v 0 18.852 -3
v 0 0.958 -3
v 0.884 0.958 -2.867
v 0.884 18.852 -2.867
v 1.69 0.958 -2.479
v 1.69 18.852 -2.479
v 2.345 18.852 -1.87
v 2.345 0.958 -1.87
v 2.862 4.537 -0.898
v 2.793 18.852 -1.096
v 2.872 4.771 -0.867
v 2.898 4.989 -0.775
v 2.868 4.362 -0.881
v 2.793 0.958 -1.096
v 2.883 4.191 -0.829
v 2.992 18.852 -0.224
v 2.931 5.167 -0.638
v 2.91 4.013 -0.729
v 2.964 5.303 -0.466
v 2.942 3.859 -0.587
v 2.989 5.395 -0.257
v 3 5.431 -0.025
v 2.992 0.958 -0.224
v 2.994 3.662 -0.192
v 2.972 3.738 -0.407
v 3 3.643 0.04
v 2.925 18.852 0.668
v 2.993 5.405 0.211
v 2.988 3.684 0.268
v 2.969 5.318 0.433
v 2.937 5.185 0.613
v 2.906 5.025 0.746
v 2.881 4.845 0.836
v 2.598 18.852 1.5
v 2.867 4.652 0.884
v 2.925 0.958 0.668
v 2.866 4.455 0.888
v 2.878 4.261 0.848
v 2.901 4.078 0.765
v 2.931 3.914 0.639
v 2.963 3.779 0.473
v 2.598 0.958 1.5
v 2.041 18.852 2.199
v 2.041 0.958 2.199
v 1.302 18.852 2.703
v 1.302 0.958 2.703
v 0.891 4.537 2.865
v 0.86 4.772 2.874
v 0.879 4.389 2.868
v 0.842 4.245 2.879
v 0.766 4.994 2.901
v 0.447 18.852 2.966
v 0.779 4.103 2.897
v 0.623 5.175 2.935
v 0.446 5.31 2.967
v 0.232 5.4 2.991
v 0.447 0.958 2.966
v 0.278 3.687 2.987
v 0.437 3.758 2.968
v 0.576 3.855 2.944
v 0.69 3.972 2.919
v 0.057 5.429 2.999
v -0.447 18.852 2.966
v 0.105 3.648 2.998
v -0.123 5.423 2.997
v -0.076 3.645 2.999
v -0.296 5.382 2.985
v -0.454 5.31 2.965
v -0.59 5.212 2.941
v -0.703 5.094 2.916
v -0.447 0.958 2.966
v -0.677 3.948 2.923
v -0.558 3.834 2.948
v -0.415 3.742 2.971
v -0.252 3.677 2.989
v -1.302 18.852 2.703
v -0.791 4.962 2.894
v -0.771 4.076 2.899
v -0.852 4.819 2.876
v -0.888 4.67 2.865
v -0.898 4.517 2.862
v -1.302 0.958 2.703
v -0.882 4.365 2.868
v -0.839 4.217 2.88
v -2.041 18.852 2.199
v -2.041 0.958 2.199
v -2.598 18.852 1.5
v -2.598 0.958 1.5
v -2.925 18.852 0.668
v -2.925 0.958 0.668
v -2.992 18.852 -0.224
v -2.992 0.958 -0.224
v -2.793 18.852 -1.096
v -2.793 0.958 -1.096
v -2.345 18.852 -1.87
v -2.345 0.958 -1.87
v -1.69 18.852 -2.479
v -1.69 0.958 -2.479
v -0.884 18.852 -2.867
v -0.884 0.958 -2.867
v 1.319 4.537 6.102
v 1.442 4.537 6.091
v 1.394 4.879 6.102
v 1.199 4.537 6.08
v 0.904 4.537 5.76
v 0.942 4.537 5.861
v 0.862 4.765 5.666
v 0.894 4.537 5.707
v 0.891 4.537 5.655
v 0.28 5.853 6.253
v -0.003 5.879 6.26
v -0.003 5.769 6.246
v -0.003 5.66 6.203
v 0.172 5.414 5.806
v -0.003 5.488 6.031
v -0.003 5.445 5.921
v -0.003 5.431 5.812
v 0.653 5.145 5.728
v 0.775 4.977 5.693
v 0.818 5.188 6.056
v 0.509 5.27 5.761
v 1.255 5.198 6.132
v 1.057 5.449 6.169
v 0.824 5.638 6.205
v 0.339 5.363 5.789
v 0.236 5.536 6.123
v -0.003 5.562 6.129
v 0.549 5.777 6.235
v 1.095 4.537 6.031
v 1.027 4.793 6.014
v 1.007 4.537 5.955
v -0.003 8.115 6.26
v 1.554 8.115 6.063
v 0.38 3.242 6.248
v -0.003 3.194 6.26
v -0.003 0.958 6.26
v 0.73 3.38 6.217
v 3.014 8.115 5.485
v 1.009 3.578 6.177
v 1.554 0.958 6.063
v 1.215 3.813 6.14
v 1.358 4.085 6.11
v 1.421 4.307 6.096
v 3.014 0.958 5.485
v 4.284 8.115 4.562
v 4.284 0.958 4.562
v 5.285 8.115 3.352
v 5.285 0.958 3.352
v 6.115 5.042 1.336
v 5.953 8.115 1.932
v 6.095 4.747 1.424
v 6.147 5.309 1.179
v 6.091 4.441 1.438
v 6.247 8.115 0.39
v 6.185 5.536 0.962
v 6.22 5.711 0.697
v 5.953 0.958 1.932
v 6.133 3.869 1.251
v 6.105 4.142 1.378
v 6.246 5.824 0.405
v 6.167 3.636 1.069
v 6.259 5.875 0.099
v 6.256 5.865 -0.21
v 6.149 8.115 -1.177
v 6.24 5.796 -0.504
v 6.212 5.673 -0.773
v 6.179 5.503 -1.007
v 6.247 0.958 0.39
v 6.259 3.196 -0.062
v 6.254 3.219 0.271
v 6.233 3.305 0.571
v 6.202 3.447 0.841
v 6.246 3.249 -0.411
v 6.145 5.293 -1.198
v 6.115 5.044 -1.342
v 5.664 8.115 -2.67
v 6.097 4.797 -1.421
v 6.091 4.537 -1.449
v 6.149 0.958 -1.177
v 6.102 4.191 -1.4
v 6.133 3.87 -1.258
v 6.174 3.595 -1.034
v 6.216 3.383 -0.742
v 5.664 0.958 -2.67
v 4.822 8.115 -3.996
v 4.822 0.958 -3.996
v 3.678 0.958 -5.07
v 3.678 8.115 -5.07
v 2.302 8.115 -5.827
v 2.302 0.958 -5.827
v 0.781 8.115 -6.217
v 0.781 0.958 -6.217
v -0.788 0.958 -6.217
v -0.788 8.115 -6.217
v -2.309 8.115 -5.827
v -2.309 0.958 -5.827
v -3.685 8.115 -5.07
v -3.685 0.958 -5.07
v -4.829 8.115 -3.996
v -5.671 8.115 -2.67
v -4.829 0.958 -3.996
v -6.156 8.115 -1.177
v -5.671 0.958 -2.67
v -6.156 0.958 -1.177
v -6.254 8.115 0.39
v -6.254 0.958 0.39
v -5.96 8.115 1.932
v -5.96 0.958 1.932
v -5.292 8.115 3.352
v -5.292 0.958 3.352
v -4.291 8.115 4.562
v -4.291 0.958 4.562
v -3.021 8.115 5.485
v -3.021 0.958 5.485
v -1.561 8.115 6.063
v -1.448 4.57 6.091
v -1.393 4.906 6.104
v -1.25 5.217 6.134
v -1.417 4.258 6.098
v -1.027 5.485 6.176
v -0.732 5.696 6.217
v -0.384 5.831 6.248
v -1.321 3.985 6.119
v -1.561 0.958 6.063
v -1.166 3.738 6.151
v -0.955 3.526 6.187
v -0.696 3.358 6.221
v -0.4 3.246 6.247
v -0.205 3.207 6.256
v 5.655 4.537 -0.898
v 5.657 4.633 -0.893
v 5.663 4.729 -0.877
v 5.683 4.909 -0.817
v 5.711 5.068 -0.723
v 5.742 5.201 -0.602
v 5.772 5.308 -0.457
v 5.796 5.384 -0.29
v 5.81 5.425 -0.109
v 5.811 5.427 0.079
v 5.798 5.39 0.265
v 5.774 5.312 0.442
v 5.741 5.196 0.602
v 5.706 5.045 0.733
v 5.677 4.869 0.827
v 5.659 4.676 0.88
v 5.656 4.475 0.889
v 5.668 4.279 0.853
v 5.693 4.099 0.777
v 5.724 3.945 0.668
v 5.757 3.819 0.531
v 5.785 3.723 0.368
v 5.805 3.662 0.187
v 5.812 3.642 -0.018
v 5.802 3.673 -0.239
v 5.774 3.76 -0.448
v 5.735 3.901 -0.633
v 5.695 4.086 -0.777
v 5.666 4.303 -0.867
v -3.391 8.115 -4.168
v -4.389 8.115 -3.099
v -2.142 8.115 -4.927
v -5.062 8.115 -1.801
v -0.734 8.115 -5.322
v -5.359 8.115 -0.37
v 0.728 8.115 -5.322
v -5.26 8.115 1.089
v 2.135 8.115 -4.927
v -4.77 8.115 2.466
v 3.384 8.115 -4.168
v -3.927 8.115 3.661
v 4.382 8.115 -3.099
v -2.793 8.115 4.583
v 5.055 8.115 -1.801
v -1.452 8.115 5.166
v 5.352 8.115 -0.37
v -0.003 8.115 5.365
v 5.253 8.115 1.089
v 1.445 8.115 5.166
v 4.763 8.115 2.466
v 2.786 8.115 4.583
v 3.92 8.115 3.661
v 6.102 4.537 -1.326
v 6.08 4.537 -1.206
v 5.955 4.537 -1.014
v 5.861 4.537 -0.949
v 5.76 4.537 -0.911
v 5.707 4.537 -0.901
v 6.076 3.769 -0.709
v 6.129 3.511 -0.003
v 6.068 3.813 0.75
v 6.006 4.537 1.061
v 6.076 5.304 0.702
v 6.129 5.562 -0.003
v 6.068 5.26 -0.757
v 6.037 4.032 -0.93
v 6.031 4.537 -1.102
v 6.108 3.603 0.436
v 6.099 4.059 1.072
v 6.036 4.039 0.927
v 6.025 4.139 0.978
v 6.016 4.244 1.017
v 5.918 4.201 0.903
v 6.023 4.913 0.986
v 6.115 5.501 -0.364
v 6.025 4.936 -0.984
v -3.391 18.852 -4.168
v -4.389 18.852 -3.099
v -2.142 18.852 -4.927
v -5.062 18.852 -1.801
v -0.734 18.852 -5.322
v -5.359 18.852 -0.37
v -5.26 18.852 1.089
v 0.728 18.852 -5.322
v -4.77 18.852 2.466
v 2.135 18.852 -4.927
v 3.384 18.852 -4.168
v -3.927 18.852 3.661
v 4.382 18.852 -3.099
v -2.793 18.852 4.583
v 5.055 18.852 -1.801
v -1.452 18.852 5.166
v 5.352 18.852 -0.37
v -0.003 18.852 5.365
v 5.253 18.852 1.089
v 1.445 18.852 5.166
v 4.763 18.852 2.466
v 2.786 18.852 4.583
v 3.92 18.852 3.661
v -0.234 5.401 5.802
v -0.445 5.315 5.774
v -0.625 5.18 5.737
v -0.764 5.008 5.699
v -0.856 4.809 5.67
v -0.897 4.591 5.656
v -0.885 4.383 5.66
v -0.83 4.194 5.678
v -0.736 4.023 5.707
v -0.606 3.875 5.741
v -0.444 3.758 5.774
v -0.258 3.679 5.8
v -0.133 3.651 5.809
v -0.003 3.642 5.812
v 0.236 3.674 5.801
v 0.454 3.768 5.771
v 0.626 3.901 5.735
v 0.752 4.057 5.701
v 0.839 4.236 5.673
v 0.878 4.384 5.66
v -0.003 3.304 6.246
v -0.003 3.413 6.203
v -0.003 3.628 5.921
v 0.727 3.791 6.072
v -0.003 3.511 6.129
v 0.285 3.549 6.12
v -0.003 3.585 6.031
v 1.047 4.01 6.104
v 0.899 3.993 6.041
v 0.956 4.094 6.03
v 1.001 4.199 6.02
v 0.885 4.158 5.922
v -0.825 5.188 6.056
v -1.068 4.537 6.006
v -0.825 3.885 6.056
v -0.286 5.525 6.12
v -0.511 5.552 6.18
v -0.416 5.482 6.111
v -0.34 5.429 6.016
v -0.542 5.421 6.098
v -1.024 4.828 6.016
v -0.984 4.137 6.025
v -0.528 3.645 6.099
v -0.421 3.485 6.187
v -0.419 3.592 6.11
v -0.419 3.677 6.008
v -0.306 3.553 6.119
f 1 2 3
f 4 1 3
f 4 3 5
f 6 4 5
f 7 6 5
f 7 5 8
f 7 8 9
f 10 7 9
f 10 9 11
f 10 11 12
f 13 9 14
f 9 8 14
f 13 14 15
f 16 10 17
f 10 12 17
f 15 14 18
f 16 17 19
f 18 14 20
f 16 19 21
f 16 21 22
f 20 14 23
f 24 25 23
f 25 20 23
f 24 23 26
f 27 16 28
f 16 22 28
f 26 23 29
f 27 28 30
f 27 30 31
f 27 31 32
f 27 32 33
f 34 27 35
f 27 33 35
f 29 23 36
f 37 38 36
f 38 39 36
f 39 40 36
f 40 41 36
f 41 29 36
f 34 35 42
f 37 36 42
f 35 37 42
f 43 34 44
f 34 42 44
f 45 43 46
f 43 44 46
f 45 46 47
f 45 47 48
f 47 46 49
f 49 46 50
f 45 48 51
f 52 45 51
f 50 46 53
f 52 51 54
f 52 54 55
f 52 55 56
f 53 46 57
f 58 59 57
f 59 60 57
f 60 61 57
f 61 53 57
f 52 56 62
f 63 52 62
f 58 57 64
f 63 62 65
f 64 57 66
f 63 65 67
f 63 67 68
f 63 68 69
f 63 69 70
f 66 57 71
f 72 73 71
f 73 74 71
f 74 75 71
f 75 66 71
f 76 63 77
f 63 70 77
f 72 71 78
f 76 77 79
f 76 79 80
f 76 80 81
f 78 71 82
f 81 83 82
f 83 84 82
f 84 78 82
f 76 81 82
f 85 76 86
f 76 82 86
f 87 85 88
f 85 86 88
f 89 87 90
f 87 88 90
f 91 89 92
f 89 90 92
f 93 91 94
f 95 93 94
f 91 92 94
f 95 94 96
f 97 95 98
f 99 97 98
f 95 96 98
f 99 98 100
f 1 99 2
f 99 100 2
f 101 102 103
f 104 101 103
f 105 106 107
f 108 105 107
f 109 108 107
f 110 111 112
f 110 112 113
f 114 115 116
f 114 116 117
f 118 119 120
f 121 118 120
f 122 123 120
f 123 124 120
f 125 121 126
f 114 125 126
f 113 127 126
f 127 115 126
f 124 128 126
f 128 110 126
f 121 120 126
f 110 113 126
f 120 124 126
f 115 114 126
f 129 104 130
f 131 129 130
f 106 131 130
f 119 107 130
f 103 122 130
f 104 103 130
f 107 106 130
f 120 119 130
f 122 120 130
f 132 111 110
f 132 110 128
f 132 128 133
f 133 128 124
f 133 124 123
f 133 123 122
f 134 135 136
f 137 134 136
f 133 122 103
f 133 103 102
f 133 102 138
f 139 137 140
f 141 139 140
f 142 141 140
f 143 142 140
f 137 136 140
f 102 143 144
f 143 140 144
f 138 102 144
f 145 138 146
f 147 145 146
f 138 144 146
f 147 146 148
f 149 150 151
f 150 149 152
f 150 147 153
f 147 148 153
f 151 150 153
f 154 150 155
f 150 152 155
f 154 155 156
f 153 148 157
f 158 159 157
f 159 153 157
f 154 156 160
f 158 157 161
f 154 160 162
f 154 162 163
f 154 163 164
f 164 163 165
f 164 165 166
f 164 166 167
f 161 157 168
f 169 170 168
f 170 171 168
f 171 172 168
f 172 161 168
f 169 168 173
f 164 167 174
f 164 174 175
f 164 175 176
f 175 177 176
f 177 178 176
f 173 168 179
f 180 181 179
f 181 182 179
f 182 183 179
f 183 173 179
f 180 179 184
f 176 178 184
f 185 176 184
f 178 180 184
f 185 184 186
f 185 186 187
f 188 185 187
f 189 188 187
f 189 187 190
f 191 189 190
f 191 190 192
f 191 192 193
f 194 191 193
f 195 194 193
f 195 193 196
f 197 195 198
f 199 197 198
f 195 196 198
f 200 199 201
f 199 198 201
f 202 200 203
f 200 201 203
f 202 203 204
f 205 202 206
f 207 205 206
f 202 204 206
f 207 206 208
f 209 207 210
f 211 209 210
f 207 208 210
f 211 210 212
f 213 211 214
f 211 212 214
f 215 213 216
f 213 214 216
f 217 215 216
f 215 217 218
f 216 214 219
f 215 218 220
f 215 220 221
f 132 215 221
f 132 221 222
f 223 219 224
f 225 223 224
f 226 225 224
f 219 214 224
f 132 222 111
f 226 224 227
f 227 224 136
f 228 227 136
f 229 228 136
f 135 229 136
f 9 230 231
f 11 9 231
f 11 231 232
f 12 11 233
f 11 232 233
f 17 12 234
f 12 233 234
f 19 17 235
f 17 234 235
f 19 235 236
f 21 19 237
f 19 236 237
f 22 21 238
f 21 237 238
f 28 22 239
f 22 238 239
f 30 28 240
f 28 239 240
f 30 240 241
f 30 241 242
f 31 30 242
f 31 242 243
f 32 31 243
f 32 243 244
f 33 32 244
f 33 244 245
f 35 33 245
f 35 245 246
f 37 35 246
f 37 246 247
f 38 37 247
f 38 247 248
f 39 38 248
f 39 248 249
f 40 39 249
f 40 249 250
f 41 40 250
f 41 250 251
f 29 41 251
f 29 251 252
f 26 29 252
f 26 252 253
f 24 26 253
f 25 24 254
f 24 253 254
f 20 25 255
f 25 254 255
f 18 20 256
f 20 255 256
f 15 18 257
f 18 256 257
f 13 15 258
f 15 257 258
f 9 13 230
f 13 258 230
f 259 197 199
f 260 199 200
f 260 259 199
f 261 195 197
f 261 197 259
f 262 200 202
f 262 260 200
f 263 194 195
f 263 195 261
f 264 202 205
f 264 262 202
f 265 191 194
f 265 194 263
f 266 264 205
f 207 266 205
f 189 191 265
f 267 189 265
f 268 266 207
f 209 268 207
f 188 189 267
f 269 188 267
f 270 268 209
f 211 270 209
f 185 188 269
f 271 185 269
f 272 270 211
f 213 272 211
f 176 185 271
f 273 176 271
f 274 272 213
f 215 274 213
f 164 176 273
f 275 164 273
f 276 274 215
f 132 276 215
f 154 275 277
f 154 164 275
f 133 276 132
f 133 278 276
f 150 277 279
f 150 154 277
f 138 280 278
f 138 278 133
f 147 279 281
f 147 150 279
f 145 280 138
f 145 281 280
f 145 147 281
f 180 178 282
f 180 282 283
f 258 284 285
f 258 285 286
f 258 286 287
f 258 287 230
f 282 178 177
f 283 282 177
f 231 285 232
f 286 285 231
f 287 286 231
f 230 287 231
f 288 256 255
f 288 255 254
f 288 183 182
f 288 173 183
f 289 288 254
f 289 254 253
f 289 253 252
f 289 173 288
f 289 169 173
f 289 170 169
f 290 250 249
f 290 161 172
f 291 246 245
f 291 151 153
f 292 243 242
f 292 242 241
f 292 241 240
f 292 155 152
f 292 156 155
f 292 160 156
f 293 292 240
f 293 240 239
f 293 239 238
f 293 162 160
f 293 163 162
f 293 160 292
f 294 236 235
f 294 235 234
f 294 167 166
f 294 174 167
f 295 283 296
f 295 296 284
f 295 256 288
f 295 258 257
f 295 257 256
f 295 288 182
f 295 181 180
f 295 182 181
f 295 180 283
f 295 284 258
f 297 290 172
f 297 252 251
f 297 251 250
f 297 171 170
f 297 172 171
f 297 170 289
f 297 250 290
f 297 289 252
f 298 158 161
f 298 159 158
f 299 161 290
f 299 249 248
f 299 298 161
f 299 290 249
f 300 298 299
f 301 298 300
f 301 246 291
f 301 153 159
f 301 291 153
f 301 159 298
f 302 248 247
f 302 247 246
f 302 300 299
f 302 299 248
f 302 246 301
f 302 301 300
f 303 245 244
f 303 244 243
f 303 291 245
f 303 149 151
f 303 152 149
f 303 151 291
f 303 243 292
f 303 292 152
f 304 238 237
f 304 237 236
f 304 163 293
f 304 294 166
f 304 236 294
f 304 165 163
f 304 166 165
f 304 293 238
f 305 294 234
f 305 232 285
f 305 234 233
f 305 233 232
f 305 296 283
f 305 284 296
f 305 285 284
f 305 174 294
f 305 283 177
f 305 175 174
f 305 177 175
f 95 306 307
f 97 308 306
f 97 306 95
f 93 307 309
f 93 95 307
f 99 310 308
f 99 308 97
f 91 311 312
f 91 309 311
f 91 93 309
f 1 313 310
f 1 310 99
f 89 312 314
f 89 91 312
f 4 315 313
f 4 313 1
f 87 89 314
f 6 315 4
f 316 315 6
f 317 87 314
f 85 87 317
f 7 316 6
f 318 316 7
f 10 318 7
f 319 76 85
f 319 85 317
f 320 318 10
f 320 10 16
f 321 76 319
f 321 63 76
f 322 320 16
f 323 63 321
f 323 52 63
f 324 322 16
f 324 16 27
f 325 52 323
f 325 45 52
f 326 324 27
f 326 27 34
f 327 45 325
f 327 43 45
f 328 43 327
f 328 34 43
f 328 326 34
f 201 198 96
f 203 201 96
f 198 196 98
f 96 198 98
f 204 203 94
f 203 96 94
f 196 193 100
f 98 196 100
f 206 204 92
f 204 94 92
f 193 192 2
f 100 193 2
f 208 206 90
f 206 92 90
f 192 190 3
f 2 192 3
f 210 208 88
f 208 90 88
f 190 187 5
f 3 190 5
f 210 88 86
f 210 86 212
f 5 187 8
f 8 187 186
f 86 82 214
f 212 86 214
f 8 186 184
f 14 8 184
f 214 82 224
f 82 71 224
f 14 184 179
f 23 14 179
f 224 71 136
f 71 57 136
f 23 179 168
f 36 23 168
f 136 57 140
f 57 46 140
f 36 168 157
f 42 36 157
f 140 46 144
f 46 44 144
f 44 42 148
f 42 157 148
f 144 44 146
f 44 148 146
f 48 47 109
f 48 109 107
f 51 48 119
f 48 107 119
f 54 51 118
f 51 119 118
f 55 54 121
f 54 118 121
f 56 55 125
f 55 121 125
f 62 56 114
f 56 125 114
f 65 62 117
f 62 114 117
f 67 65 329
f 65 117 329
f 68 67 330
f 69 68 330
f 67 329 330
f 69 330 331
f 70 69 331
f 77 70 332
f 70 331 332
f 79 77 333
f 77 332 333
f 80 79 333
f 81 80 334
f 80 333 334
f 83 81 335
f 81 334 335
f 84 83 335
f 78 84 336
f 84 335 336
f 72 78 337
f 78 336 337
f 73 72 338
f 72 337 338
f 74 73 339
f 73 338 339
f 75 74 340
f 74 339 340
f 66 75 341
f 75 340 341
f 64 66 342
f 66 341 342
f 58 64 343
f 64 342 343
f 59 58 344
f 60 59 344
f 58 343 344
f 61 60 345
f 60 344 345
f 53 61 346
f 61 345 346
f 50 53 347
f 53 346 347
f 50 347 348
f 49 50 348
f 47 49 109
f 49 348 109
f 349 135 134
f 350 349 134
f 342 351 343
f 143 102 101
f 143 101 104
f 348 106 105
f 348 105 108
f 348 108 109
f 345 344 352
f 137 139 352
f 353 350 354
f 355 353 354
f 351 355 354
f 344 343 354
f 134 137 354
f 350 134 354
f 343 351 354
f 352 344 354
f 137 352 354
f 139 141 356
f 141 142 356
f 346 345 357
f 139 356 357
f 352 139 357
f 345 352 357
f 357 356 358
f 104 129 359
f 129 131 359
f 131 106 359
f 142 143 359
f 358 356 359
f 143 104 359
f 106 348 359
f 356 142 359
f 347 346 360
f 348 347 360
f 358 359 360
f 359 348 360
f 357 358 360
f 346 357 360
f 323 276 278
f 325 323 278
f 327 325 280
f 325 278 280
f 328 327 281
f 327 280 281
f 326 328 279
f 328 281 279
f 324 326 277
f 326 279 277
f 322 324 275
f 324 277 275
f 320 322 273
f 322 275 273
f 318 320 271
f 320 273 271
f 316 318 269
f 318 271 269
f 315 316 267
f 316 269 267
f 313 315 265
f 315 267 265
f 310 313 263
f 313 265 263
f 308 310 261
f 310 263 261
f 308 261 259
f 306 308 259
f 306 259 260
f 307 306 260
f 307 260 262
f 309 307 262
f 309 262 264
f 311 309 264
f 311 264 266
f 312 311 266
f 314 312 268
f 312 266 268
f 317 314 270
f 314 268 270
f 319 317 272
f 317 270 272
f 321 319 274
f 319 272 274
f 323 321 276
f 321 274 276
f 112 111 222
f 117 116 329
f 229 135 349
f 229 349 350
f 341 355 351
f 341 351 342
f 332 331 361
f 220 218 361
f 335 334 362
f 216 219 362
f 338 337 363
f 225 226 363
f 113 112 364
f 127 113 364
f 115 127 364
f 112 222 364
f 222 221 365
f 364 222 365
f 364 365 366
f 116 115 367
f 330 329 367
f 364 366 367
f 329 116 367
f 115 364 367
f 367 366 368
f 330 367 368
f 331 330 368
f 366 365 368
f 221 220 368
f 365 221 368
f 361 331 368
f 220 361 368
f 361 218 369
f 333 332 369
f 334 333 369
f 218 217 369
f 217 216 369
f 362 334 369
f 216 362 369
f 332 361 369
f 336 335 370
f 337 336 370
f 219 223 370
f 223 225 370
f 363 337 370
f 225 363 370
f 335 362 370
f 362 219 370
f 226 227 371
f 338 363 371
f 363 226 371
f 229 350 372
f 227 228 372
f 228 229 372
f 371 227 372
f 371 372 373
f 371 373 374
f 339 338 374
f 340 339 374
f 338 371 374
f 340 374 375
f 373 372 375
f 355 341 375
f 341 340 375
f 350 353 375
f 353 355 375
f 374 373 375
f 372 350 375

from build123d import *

# Parameters (mm, degrees)
SKETCH1_R               = 7
BOSS_EXTRUDE1_DEPTH     = 8
SKETCH2_R               = 6
BOSS_EXTRUDE2_DEPTH     = 14
SKETCH6_R               = 3
CUT_EXTRUDE2_DEPTH      = 20
CUT_EXTRUDE3_REACH      = 29
CUT_EXTRUDE3_END_RADIUS = 3
SKETCH8_R               = 1
CIRPATTERN1_COUNT       = 2
CIRPATTERN1_ANGLE       = 90
FILLET1_R               = 0.5
SKETCH3_R               = 7
CUT_EXTRUDE_2_DEPTH     = 2
SCALE_1_SCALE           = 0.894736842
SKETCH_1_R              = 3
CUT_EXTRUDE_3_DEPTH     = 20.969059417


with BuildPart() as part:
    # Sketch1 → Boss-Extrude1 (new body)
    with BuildSketch(Plane(origin=(0, 0, 0), x_dir=(1, 0, 0), z_dir=(0, 1, 0))):
        with Locations(Location((0, 0, 0), (0, 0, 270))):
            Circle(SKETCH1_R)
    extrude(amount=BOSS_EXTRUDE1_DEPTH)

    # Sketch2 → Boss-Extrude2 (add)
    with BuildSketch(Plane(origin=(0, 8, 0), x_dir=(1, 0, 0), z_dir=(0, 1, 0))):
        with Locations(Location((0, 0, 0), (0, 0, 270))):
            Circle(SKETCH2_R)
    extrude(amount=BOSS_EXTRUDE2_DEPTH)

    # Sketch6 → Cut-Extrude2 (cut)
    with BuildSketch(Plane.XZ):
        with Locations(Location((0, 0, 0), (0, 0, 270))):
            Circle(SKETCH6_R)
    extrude(amount=-CUT_EXTRUDE2_DEPTH, mode=Mode.SUBTRACT)

    # Cut-Extrude3: up to this cylinder (the profile starts outside it)
    cut_extrude3_end = Plane(origin=(0, 4, 0), z_dir=(0, -1, 0)) * Cylinder(CUT_EXTRUDE3_END_RADIUS, 65, mode=Mode.PRIVATE)
    # Sketch8 → Cut-Extrude3 (cut, up to the surface)
    with BuildSketch(Plane.XY.offset(7), mode=Mode.PRIVATE) as cut_extrude3_sk1:
        with Locations((0, 4)):
            Circle(SKETCH8_R)
    cut_extrude3_tool1 = extrude(cut_extrude3_sk1.sketch, amount=-CUT_EXTRUDE3_REACH, mode=Mode.PRIVATE) - cut_extrude3_end
    cut_extrude3 = cut_extrude3_tool1.solids().sort_by_distance((0, 4, 7))[0]
    add(cut_extrude3, mode=Mode.SUBTRACT)

    # CirPattern1: Cut-Extrude3 ×2 about axis
    cirpattern1_axis = Axis((0, 0, 0), (0, 1, 0))
    for i in range(1, CIRPATTERN1_COUNT):
        add(cut_extrude3.rotate(cirpattern1_axis, i * CIRPATTERN1_ANGLE / (CIRPATTERN1_COUNT - 1)), mode=Mode.SUBTRACT)

    # Fillet1
    fillet1_edges = [part.edges().sort_by_distance(p)[0] for p in [
        (-1, 4, 6.92820323),
        (6.92820323, 4, 1),
    ]]
    fillet(fillet1_edges, radius=FILLET1_R)

    # Sketch3 → ｶｯﾄ - 押し出し2 (cut)
    with BuildSketch(Plane(origin=(0, 22, 0), x_dir=(1, 0, 0), z_dir=(0, 1, 0))):
        with Locations(Location((0, 0, 0), (0, 0, 270))):
            Circle(SKETCH3_R)
    extrude(amount=-CUT_EXTRUDE_2_DEPTH, mode=Mode.SUBTRACT)


with BuildPart() as part_1:
    # ｽｹｰﾙ1: scaled about (-0.033116377, 9.097196925, -0.033121406)
    add(part.part.scale(SCALE_1_SCALE).moved(Location((-0.003485934, 0.957599676, -0.003486464))))

    # ｽｹｯﾁ1 → ｶｯﾄ - 押し出し3 (cut, through all)
    with BuildSketch(Plane.XZ.offset(-0.957597864)):
        with Locations(Location((0, 0, 0), (0, 0, 270))):
            Circle(SKETCH_1_R)
    extrude(amount=-CUT_EXTRUDE_3_DEPTH, mode=Mode.SUBTRACT)


solid = part_1.part
